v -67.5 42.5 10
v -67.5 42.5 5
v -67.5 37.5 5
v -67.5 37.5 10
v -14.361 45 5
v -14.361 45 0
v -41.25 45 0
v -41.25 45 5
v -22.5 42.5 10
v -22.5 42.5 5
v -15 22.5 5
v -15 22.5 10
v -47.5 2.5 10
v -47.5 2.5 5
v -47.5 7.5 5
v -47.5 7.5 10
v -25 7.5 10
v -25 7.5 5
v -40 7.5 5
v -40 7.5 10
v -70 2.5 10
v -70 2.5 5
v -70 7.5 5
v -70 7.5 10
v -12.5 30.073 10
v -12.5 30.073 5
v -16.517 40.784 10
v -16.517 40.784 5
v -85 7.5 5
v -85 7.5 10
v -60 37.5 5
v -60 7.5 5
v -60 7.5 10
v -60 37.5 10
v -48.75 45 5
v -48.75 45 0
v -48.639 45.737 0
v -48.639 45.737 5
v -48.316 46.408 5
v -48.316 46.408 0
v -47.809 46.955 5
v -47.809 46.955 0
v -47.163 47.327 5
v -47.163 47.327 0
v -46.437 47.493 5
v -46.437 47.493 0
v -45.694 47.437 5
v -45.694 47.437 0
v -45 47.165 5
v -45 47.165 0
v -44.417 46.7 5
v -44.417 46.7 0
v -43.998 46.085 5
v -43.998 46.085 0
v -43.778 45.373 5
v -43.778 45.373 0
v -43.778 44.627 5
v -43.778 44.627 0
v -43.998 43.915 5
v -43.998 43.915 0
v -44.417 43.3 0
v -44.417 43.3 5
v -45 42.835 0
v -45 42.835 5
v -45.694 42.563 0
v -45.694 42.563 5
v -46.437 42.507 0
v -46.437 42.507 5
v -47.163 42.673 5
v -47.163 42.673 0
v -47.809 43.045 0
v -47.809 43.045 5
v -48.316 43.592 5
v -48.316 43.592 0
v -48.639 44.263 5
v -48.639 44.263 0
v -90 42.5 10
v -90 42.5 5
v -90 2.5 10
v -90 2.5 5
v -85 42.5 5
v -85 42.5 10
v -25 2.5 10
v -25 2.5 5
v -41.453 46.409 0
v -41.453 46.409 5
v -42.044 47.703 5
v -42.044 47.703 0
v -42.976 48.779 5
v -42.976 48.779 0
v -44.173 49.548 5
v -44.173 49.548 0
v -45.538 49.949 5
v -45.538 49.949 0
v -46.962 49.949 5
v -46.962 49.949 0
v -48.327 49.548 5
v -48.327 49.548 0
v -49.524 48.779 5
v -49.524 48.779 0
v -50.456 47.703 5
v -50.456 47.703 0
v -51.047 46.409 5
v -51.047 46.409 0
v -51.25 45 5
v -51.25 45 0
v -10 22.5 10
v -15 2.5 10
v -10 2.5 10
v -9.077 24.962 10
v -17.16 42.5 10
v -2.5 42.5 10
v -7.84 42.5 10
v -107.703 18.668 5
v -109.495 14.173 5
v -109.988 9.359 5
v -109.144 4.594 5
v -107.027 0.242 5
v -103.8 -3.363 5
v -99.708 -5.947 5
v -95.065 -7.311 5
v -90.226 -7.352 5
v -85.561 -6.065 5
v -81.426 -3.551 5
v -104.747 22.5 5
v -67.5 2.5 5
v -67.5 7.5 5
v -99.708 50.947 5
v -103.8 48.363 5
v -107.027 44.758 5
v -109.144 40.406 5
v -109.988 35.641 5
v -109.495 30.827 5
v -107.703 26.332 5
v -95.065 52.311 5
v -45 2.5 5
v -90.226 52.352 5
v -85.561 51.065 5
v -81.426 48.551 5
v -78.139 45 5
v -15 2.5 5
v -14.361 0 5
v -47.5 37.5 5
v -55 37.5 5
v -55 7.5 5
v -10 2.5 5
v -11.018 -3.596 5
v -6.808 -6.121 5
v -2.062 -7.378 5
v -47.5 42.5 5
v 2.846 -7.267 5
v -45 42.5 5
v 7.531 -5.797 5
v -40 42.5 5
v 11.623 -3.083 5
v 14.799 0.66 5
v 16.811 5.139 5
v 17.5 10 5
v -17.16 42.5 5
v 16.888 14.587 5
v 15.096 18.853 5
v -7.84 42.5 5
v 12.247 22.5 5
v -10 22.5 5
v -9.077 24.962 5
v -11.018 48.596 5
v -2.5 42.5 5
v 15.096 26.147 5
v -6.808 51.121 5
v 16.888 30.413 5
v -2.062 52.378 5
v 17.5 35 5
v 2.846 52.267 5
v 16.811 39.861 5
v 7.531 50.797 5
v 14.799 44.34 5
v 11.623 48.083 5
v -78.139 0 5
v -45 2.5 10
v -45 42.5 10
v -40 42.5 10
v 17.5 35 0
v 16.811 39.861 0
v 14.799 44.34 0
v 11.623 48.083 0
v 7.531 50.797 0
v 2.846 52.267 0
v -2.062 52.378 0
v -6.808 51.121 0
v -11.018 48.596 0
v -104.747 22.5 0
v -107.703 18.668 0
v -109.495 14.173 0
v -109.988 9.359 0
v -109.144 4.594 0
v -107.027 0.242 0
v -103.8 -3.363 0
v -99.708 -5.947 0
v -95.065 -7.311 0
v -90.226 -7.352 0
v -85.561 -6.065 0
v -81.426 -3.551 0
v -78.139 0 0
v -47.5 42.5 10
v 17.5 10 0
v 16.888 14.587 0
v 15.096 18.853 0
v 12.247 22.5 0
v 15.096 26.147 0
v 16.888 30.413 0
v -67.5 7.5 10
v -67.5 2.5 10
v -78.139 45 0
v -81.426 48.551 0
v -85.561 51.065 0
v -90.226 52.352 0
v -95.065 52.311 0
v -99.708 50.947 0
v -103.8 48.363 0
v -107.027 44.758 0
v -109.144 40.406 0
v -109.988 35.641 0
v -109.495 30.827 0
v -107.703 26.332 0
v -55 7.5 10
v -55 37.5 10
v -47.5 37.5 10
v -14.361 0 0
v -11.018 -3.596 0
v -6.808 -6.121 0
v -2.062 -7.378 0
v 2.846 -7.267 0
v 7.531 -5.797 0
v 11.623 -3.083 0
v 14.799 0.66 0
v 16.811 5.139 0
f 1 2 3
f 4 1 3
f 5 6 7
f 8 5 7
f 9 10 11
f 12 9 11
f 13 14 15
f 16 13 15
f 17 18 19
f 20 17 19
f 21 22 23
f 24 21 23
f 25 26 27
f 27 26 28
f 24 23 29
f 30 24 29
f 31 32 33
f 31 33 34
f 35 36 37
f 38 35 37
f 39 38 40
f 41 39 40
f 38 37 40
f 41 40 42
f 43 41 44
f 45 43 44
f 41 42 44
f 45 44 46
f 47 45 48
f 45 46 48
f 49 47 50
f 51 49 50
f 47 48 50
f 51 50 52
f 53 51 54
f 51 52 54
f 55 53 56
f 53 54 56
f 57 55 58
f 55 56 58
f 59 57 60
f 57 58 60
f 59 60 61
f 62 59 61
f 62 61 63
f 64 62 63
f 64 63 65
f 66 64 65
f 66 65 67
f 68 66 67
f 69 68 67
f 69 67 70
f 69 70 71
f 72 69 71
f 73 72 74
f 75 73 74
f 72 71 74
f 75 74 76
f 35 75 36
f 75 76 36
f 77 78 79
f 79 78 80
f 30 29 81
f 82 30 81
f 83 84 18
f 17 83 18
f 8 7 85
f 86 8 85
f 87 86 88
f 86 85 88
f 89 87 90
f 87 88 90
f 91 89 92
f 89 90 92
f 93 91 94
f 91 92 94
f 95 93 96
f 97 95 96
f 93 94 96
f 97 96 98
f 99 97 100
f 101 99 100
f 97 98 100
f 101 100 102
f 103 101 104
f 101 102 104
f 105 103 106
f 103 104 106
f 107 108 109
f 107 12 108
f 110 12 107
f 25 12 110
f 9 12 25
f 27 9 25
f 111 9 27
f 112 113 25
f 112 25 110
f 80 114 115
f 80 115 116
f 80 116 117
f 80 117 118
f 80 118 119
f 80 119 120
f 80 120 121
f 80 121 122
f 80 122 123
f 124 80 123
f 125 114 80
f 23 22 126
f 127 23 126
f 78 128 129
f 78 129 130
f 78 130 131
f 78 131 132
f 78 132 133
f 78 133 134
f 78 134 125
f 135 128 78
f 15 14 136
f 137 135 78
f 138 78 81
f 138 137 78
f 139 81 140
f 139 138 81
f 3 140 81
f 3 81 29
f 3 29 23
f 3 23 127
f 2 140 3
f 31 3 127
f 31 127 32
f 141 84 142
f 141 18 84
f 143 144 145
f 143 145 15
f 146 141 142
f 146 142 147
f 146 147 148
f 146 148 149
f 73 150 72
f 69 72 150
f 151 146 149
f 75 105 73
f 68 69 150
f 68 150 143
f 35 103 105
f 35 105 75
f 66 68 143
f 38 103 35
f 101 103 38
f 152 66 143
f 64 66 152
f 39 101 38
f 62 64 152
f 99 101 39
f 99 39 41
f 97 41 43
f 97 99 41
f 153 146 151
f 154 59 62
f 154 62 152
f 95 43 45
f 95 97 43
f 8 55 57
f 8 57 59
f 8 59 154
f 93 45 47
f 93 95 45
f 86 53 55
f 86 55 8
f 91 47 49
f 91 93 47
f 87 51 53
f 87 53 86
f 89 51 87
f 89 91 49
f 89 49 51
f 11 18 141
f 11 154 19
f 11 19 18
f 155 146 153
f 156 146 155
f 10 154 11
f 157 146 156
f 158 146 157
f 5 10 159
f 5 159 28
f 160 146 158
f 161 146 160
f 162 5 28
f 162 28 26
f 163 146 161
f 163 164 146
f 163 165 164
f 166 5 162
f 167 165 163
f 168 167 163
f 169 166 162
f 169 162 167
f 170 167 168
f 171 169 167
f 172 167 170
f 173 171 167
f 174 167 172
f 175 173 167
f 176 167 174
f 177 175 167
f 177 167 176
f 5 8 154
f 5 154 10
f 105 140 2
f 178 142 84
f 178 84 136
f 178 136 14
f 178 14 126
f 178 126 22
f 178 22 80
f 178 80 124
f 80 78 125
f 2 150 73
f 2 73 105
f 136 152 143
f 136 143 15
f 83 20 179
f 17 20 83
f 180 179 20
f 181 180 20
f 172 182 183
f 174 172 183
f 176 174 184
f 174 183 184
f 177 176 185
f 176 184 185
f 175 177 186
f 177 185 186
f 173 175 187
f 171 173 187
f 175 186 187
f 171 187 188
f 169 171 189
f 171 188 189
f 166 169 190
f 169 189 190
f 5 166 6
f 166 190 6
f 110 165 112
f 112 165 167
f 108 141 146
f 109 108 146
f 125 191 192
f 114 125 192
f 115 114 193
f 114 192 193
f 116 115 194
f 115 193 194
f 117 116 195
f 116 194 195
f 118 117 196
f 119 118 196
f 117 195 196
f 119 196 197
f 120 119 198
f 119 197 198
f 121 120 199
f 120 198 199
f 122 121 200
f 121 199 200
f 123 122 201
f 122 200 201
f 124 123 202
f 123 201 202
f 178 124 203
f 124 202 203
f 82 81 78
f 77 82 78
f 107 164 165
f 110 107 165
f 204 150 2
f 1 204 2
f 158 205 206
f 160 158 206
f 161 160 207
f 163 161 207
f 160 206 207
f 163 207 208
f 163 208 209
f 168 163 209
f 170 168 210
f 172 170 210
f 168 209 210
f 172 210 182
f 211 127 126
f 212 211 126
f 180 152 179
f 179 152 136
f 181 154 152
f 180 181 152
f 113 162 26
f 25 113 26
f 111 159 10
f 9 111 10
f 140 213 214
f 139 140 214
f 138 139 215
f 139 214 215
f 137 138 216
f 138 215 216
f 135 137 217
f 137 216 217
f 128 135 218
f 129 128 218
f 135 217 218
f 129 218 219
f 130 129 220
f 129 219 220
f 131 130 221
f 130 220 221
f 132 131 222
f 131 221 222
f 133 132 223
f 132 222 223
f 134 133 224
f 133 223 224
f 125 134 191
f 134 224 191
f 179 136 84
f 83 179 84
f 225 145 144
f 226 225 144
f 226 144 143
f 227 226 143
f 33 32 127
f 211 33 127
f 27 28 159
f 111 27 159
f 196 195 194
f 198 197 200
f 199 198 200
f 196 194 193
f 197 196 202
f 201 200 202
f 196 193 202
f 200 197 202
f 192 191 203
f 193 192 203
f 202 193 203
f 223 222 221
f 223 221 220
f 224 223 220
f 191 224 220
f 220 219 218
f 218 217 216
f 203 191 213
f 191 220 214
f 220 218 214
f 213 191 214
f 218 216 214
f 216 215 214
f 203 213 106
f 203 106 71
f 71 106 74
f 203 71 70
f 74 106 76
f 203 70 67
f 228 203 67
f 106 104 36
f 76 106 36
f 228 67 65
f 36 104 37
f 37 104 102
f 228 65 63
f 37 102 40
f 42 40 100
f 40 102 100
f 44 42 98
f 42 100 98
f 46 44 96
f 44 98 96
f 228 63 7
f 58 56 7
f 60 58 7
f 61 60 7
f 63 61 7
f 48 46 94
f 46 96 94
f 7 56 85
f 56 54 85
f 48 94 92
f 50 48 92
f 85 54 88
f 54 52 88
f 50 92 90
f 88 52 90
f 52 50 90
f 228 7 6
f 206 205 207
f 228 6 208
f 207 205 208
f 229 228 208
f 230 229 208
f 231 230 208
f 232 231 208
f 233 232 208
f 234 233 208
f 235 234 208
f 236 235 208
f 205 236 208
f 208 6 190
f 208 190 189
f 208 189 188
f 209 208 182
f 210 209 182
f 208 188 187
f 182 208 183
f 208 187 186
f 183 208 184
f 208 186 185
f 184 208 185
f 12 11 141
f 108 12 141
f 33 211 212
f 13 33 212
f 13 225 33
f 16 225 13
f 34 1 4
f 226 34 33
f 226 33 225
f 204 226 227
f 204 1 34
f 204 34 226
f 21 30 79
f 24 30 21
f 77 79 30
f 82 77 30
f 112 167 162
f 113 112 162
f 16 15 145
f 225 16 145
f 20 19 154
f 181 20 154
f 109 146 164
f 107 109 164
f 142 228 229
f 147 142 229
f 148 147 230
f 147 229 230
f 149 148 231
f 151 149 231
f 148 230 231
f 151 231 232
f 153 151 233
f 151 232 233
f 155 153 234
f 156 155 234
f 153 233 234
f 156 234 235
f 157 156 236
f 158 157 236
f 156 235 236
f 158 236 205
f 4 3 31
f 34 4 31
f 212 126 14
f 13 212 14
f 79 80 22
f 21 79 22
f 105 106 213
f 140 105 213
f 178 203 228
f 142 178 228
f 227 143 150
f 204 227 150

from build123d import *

# Parameters (mm, degrees)
F0_W     = 15
F0_H     = 35
F0_W_2   = 5
F0_H_2   = 5
F0_W_3   = 7.5
F0_H_3   = 30
F1_DEPTH = 5
F2_DEPTH = 10


with BuildPart() as f1:
    # F0 (on Top) → F1 (new body)
    with BuildSketch(Plane.XY):
        with BuildLine():
            Line((-90, 27.3205080757), (-90, 42.5))
            Line((-90, 42.5), (-85, 42.5))
            Line((-85, 42.5), (-76.6886116992, 42.5))
            ThreePointArc((-76.6886116992, 42.5), (-77.3619060553, 43.7799835832), (-78.1385933837, 45))
            Line((-78.1385933837, 45), (-92.5, 45))
            Line((-92.5, 45), (-92.5, 27.5))
            ThreePointArc((-92.5, 27.5), (-91.2467824061, 27.4550693399), (-90, 27.3205080757))
        make_face()
        with BuildLine():
            ThreePointArc((-78.1385933837, 45), (-77.3619060553, 43.7799835832), (-76.6886116992, 42.5))
            Line((-76.6886116992, 42.5), (-70, 42.5))
            Line((-70, 42.5), (-70, 7.5))
            Line((-70, 7.5), (-70, 2.5))
            Line((-70, 2.5), (-76.6886116992, 2.5))
            ThreePointArc((-76.6886116992, 2.5), (-77.3619060553, 1.2200164168), (-78.1385933837, 0))
            Line((-78.1385933837, 0), (-14.3614066163, 0))
            ThreePointArc((-14.3614066163, 0), (-15.1380939447, 1.2200164168), (-15.8113883008, 2.5))
            Line((-15.8113883008, 2.5), (-22.5, 2.5))
            Line((-22.5, 2.5), (-22.5, 22.5))
            Line((-22.5, 22.5), (-22.5, 42.5))
            Line((-22.5, 42.5), (-17.1599976592, 42.5))
            Line((-17.1599976592, 42.5), (-15.8113883008, 42.5))
            ThreePointArc((-15.8113883008, 42.5), (-15.1380939447, 43.7799835832), (-14.3614066163, 45))
            Line((-14.3614066163, 45), (-41.25, 45))
            ThreePointArc((-41.25, 45), (-41.4203708686, 43.7059047745), (-41.9198729811, 42.5))
            Line((-41.9198729811, 42.5), (-40, 42.5))
            Line((-40, 42.5), (-25, 42.5))
            Line((-25, 42.5), (-25, 7.5))
            Line((-25, 7.5), (-25, 2.5))
            Line((-25, 2.5), (-40, 2.5))
            Line((-40, 2.5), (-45, 2.5))
            Line((-45, 2.5), (-45, 7.5))
            Line((-45, 7.5), (-45, 40.1587708172))
            ThreePointArc((-45, 40.1587708172), (-46.25, 40), (-47.5, 40.1587708172))
            Line((-47.5, 40.1587708172), (-47.5, 37.5))
            Line((-47.5, 37.5), (-47.5, 7.5))
            Line((-47.5, 7.5), (-47.5, 2.5))
            Line((-47.5, 2.5), (-67.5, 2.5))
            Line((-67.5, 2.5), (-67.5, 7.5))
            Line((-67.5, 7.5), (-67.5, 37.5))
            Line((-67.5, 37.5), (-67.5, 42.5))
            Line((-67.5, 42.5), (-50.5801270189, 42.5))
            ThreePointArc((-50.5801270189, 42.5), (-51.0796291314, 43.7059047745), (-51.25, 45))
            Line((-51.25, 45), (-78.1385933837, 45))
        make_face()
        with BuildLine():
            Line((-90, 7.5), (-90, 17.6794919243))
            ThreePointArc((-90, 17.6794919243), (-91.2467824061, 17.5449306601), (-92.5, 17.5))
            Line((-92.5, 17.5), (-92.5, 0))
            Line((-92.5, 0), (-78.1385933837, 0))
            ThreePointArc((-78.1385933837, 0), (-77.3619060553, 1.2200164168), (-76.6886116992, 2.5))
            Line((-76.6886116992, 2.5), (-85, 2.5))
            Line((-85, 2.5), (-90, 2.5))
            Line((-90, 2.5), (-90, 7.5))
        make_face()
        with BuildLine():
            ThreePointArc((-104.7474487139, 22.5), (-99.1143782777, 26.201851746), (-92.5, 27.5))
            Line((-92.5, 27.5), (-92.5, 45))
            Line((-92.5, 45), (-78.1385933837, 45))
            ThreePointArc((-78.1385933837, 45), (-103.7995444379, 48.3630196998), (-104.7474487139, 22.5))
        make_face()
        with BuildLine():
            Line((-92.5, 17.5), (-92.5, 27.5))
            ThreePointArc((-92.5, 27.5), (-99.1143782777, 26.201851746), (-104.7474487139, 22.5))
            ThreePointArc((-104.7474487139, 22.5), (-99.1143782777, 18.798148254), (-92.5, 17.5))
        make_face()
        with BuildLine():
            Line((-92.5, 0), (-92.5, 17.5))
            ThreePointArc((-92.5, 17.5), (-99.1143782777, 18.798148254), (-104.7474487139, 22.5))
            ThreePointArc((-104.7474487139, 22.5), (-103.7995444379, -3.3630196998), (-78.1385933837, 0))
            Line((-78.1385933837, 0), (-92.5, 0))
        make_face()
        with BuildLine():
            ThreePointArc((-41.25, 45), (-46.25, 50), (-51.25, 45))
            Line((-51.25, 45), (-48.75, 45))
            ThreePointArc((-48.75, 45), (-46.25, 47.5), (-43.75, 45))
            Line((-43.75, 45), (-41.25, 45))
        make_face()
        with BuildLine():
            Line((-48.75, 45), (-51.25, 45))
            ThreePointArc((-51.25, 45), (-51.0796291314, 43.7059047745), (-50.5801270189, 42.5))
            Line((-50.5801270189, 42.5), (-47.5, 42.5))
            Line((-47.5, 42.5), (-47.5, 40.1587708172))
            ThreePointArc((-47.5, 40.1587708172), (-46.25, 40), (-45, 40.1587708172))
            Line((-45, 40.1587708172), (-45, 42.5))
            Line((-45, 42.5), (-41.9198729811, 42.5))
            ThreePointArc((-41.9198729811, 42.5), (-41.4203708686, 43.7059047745), (-41.25, 45))
            Line((-41.25, 45), (-43.75, 45))
            ThreePointArc((-43.75, 45), (-46.25, 42.5), (-48.75, 45))
        make_face()
        with BuildLine():
            ThreePointArc((-15.8113883008, 2.5), (-15.1380939447, 1.2200164168), (-14.3614066163, 0))
            Line((-14.3614066163, 0), (0, 0))
            Line((0, 0), (0, 17.5))
            ThreePointArc((0, 17.5), (-1.2532175939, 17.5449306601), (-2.5, 17.6794919243))
            Line((-2.5, 17.6794919243), (-2.5, 2.5))
            Line((-2.5, 2.5), (-10, 2.5))
            Line((-10, 2.5), (-15, 2.5))
            Line((-15, 2.5), (-15.8113883008, 2.5))
        make_face()
        with BuildLine():
            Line((0, 0), (-14.3614066163, 0))
            ThreePointArc((-14.3614066163, 0), (5.2404858655, -6.6969251029), (17.5, 10))
            ThreePointArc((17.5, 10), (16.1335109709, 16.7793675039), (12.2474487139, 22.5))
            ThreePointArc((12.2474487139, 22.5), (6.6143782777, 18.798148254), (0, 17.5))
            Line((0, 17.5), (0, 0))
        make_face()
        with BuildLine():
            ThreePointArc((17.5, 35), (5.2404858655, 51.6969251029), (-14.3614066163, 45))
            Line((-14.3614066163, 45), (0, 45))
            Line((0, 45), (0, 27.5))
            ThreePointArc((0, 27.5), (6.6143782777, 26.201851746), (12.2474487139, 22.5))
            ThreePointArc((12.2474487139, 22.5), (16.1335109709, 28.2206324961), (17.5, 35))
        make_face()
        with BuildLine():
            Line((0, 45), (-14.3614066163, 45))
            ThreePointArc((-14.3614066163, 45), (-15.1380939447, 43.7799835832), (-15.8113883008, 42.5))
            Line((-15.8113883008, 42.5), (-7.8400023408, 42.5))
            Line((-7.8400023408, 42.5), (-2.5, 42.5))
            Line((-2.5, 42.5), (-2.5, 27.3205080757))
            ThreePointArc((-2.5, 27.3205080757), (-1.2532175939, 27.4550693399), (0, 27.5))
            Line((0, 27.5), (0, 45))
        make_face()
        with BuildLine():
            Line((0, 27.5), (0, 17.5))
            ThreePointArc((0, 17.5), (6.6143782777, 18.798148254), (12.2474487139, 22.5))
            ThreePointArc((12.2474487139, 22.5), (6.6143782777, 26.201851746), (0, 27.5))
        make_face()
        with BuildLine():
            ThreePointArc((-2.5, 17.6794919243), (-1.2532175939, 17.5449306601), (0, 17.5))
            Line((0, 17.5), (0, 27.5))
            ThreePointArc((0, 27.5), (-1.2532175939, 27.4550693399), (-2.5, 27.3205080757))
            Line((-2.5, 27.3205080757), (-2.5, 22.5))
            Line((-2.5, 22.5), (-2.5, 17.6794919243))
        make_face()
        with BuildLine():
            Line((-2.5, 2.5), (-2.5, 17.6794919243))
            ThreePointArc((-2.5, 17.6794919243), (-6.4227385407, 18.7212276372), (-10, 20.6385933837))
            Line((-10, 20.6385933837), (-10, 2.5))
            Line((-10, 2.5), (-2.5, 2.5))
        make_face()
        with BuildLine():
            ThreePointArc((-10, 20.6385933837), (-6.4227385407, 18.7212276372), (-2.5, 17.6794919243))
            Line((-2.5, 17.6794919243), (-2.5, 22.5))
            Line((-2.5, 22.5), (-10, 22.5))
            Line((-10, 22.5), (-10, 20.6385933837))
        make_face()
        with BuildLine():
            ThreePointArc((-9.0767310941, 24.9620504158), (-5.9072630159, 26.4728335043), (-2.5, 27.3205080757))
            Line((-2.5, 27.3205080757), (-2.5, 42.5))
            Line((-2.5, 42.5), (-9.0767310941, 24.9620504158))
        make_face()
        with BuildLine():
            Line((-2.5, 22.5), (-2.5, 27.3205080757))
            ThreePointArc((-2.5, 27.3205080757), (-5.9072630159, 26.4728335043), (-9.0767310941, 24.9620504158))
            Line((-9.0767310941, 24.9620504158), (-10, 22.5))
            Line((-10, 22.5), (-2.5, 22.5))
        make_face()
        with BuildLine():
            ThreePointArc((-9.0767310941, 24.9620504158), (-10.7329205803, 23.822243516), (-12.2474487139, 22.5))
            Line((-12.2474487139, 22.5), (-10, 22.5))
            Line((-10, 22.5), (-9.0767310941, 24.9620504158))
        make_face()
        with BuildLine():
            Line((-10, 22.5), (-12.2474487139, 22.5))
            ThreePointArc((-12.2474487139, 22.5), (-11.1625916443, 21.5223686138), (-10, 20.6385933837))
            Line((-10, 20.6385933837), (-10, 22.5))
        make_face()
        with BuildLine():
            Line((-15, 19.0138781887), (-15, 2.5))
            Line((-15, 2.5), (-10, 2.5))
            Line((-10, 2.5), (-10, 20.6385933837))
            ThreePointArc((-10, 20.6385933837), (-11.1625916443, 21.5223686138), (-12.2474487139, 22.5))
            ThreePointArc((-12.2474487139, 22.5), (-13.7347779988, 20.8446241671), (-15, 19.0138781887))
        make_face()
        with BuildLine():
            Line((-15, 22.5), (-15, 19.0138781887))
            ThreePointArc((-15, 19.0138781887), (-13.7347779988, 20.8446241671), (-12.2474487139, 22.5))
            Line((-12.2474487139, 22.5), (-15, 22.5))
        make_face()
        with BuildLine():
            ThreePointArc((-15, 19.0138781887), (-17.4789145963, 10.8588041315), (-15.8113883008, 2.5))
            Line((-15.8113883008, 2.5), (-15, 2.5))
            Line((-15, 2.5), (-15, 19.0138781887))
        make_face()
        with BuildLine():
            Line((-22.5, 2.5), (-15.8113883008, 2.5))
            ThreePointArc((-15.8113883008, 2.5), (-17.4789145963, 10.8588041315), (-15, 19.0138781887))
            Line((-15, 19.0138781887), (-15, 22.5))
            Line((-15, 22.5), (-22.5, 22.5))
            Line((-22.5, 22.5), (-22.5, 2.5))
        make_face()
        Polygon((-22.5, 42.5), (-22.5, 22.5), (-15, 22.5), align=None)
        with BuildLine():
            Line((-2.5, 42.5), (-7.8400023408, 42.5))
            Line((-7.8400023408, 42.5), (-12.5, 30.0733395755))
            Line((-12.5, 30.0733395755), (-16.5165078198, 40.7840270951))
            ThreePointArc((-16.5165078198, 40.7840270951), (-17.0416463575, 31.0210190466), (-12.2474487139, 22.5))
            ThreePointArc((-12.2474487139, 22.5), (-10.7329205803, 23.822243516), (-9.0767310941, 24.9620504158))
            Line((-9.0767310941, 24.9620504158), (-2.5, 42.5))
        make_face()
        with BuildLine():
            Line((-16.5165078198, 40.7840270951), (-17.1599976592, 42.5))
            Line((-17.1599976592, 42.5), (-22.5, 42.5))
            Line((-22.5, 42.5), (-15, 22.5))
            Line((-15, 22.5), (-12.2474487139, 22.5))
            ThreePointArc((-12.2474487139, 22.5), (-17.0416463575, 31.0210190466), (-16.5165078198, 40.7840270951))
        make_face()
        with BuildLine():
            Line((-7.8400023408, 42.5), (-15.8113883008, 42.5))
            ThreePointArc((-15.8113883008, 42.5), (-16.1867031124, 41.6513639466), (-16.5165078198, 40.7840270951))
            Line((-16.5165078198, 40.7840270951), (-12.5, 30.0733395755))
            Line((-12.5, 30.0733395755), (-7.8400023408, 42.5))
        make_face()
        with BuildLine():
            ThreePointArc((-16.5165078198, 40.7840270951), (-16.1867031124, 41.6513639466), (-15.8113883008, 42.5))
            Line((-15.8113883008, 42.5), (-17.1599976592, 42.5))
            Line((-17.1599976592, 42.5), (-16.5165078198, 40.7840270951))
        make_face()
        with Locations((-32.5, 25)):
            Rectangle(F0_W, F0_H)
        with BuildLine():
            ThreePointArc((-45, 40.1587708172), (-43.224311168, 41.0193961398), (-41.9198729811, 42.5))
            Line((-41.9198729811, 42.5), (-45, 42.5))
            Line((-45, 42.5), (-45, 40.1587708172))
        make_face()
        with Locations((-42.5, 5)):
            Rectangle(F0_W_2, F0_H_2)
        with Locations((-32.5, 5)):
            Rectangle(F0_W, F0_H_2)
        Polygon((-60, 7.5), (-67.5, 7.5), (-67.5, 2.5), (-47.5, 2.5), (-47.5, 7.5), (-55, 7.5), align=None)
        with Locations((-51.25, 22.5)):
            Rectangle(F0_W_3, F0_H_3)
        with Locations((-57.5, 22.5)):
            Rectangle(F0_W_2, F0_H_3)
        with Locations((-63.75, 22.5)):
            Rectangle(F0_W_3, F0_H_3)
        with BuildLine():
            ThreePointArc((-47.5, 40.1587708172), (-49.275688832, 41.0193961398), (-50.5801270189, 42.5))
            Line((-50.5801270189, 42.5), (-67.5, 42.5))
            Line((-67.5, 42.5), (-67.5, 37.5))
            Line((-67.5, 37.5), (-60, 37.5))
            Line((-60, 37.5), (-55, 37.5))
            Line((-55, 37.5), (-47.5, 37.5))
            Line((-47.5, 37.5), (-47.5, 40.1587708172))
        make_face()
        with BuildLine():
            Line((-47.5, 42.5), (-50.5801270189, 42.5))
            ThreePointArc((-50.5801270189, 42.5), (-49.275688832, 41.0193961398), (-47.5, 40.1587708172))
            Line((-47.5, 40.1587708172), (-47.5, 42.5))
        make_face()
        with BuildLine():
            Line((-70, 42.5), (-76.6886116992, 42.5))
            ThreePointArc((-76.6886116992, 42.5), (-75.4273713907, 38.843872054), (-75, 35))
            ThreePointArc((-75, 35), (-76.3664890291, 28.2206324961), (-80.2525512861, 22.5))
            ThreePointArc((-80.2525512861, 22.5), (-76.3664890291, 16.7793675039), (-75, 10))
            ThreePointArc((-75, 10), (-75.0449306601, 8.7467824061), (-75.1794919243, 7.5))
            Line((-75.1794919243, 7.5), (-70, 7.5))
            Line((-70, 7.5), (-70, 42.5))
        make_face()
        with BuildLine():
            Line((-76.6886116992, 42.5), (-85, 42.5))
            Line((-85, 42.5), (-85, 25.8113883008))
            ThreePointArc((-85, 25.8113883008), (-82.4884189162, 24.3533356473), (-80.2525512861, 22.5))
            ThreePointArc((-80.2525512861, 22.5), (-76.3664890291, 28.2206324961), (-75, 35))
            ThreePointArc((-75, 35), (-75.4273713907, 38.843872054), (-76.6886116992, 42.5))
        make_face()
        with BuildLine():
            ThreePointArc((-80.2525512861, 22.5), (-82.4884189162, 20.6466643527), (-85, 19.1886116992))
            Line((-85, 19.1886116992), (-85, 7.5))
            Line((-85, 7.5), (-75.1794919243, 7.5))
            ThreePointArc((-75.1794919243, 7.5), (-75.0449306601, 8.7467824061), (-75, 10))
            ThreePointArc((-75, 10), (-76.3664890291, 16.7793675039), (-80.2525512861, 22.5))
        make_face()
        with BuildLine():
            ThreePointArc((-80.2525512861, 22.5), (-82.4884189162, 24.3533356473), (-85, 25.8113883008))
            Line((-85, 25.8113883008), (-85, 19.1886116992))
            ThreePointArc((-85, 19.1886116992), (-82.4884189162, 20.6466643527), (-80.2525512861, 22.5))
        make_face()
        with BuildLine():
            ThreePointArc((-85, 25.8113883008), (-87.4433844695, 26.7535261774), (-90, 27.3205080757))
            Line((-90, 27.3205080757), (-90, 17.6794919243))
            ThreePointArc((-90, 17.6794919243), (-87.4433844695, 18.2464738226), (-85, 19.1886116992))
            Line((-85, 19.1886116992), (-85, 25.8113883008))
        make_face()
        with BuildLine():
            Line((-85, 42.5), (-90, 42.5))
            Line((-90, 42.5), (-90, 27.3205080757))
            ThreePointArc((-90, 27.3205080757), (-87.4433844695, 26.7535261774), (-85, 25.8113883008))
            Line((-85, 25.8113883008), (-85, 42.5))
        make_face()
        with BuildLine():
            Line((-90, 17.6794919243), (-90, 27.3205080757))
            ThreePointArc((-90, 27.3205080757), (-91.2467824061, 27.4550693399), (-92.5, 27.5))
            Line((-92.5, 27.5), (-92.5, 17.5))
            ThreePointArc((-92.5, 17.5), (-91.2467824061, 17.5449306601), (-90, 17.6794919243))
        make_face()
        with BuildLine():
            ThreePointArc((-85, 19.1886116992), (-87.4433844695, 18.2464738226), (-90, 17.6794919243))
            Line((-90, 17.6794919243), (-90, 7.5))
            Line((-90, 7.5), (-85, 7.5))
            Line((-85, 7.5), (-85, 19.1886116992))
        make_face()
        with Locations((-87.5, 5)):
            Rectangle(F0_W_2, F0_H_2)
        with BuildLine():
            Line((-75.1794919243, 7.5), (-85, 7.5))
            Line((-85, 7.5), (-85, 2.5))
            Line((-85, 2.5), (-76.6886116992, 2.5))
            ThreePointArc((-76.6886116992, 2.5), (-75.7464738226, 4.9433844695), (-75.1794919243, 7.5))
        make_face()
        with BuildLine():
            Line((-70, 2.5), (-70, 7.5))
            Line((-70, 7.5), (-75.1794919243, 7.5))
            ThreePointArc((-75.1794919243, 7.5), (-75.7464738226, 4.9433844695), (-76.6886116992, 2.5))
            Line((-76.6886116992, 2.5), (-70, 2.5))
        make_face()
    extrude(amount=F1_DEPTH)

    # F0 (on Top) → F2 (join)
    with BuildSketch(Plane.XY):
        with BuildLine():
            Line((-85, 42.5), (-90, 42.5))
            Line((-90, 42.5), (-90, 27.3205080757))
            ThreePointArc((-90, 27.3205080757), (-87.4433844695, 26.7535261774), (-85, 25.8113883008))
            Line((-85, 25.8113883008), (-85, 42.5))
        make_face()
        with BuildLine():
            ThreePointArc((-85, 25.8113883008), (-87.4433844695, 26.7535261774), (-90, 27.3205080757))
            Line((-90, 27.3205080757), (-90, 17.6794919243))
            ThreePointArc((-90, 17.6794919243), (-87.4433844695, 18.2464738226), (-85, 19.1886116992))
            Line((-85, 19.1886116992), (-85, 25.8113883008))
        make_face()
        with BuildLine():
            ThreePointArc((-85, 19.1886116992), (-87.4433844695, 18.2464738226), (-90, 17.6794919243))
            Line((-90, 17.6794919243), (-90, 7.5))
            Line((-90, 7.5), (-85, 7.5))
            Line((-85, 7.5), (-85, 19.1886116992))
        make_face()
        with Locations((-87.5, 5)):
            Rectangle(F0_W_2, F0_H_2)
        with BuildLine():
            Line((-75.1794919243, 7.5), (-85, 7.5))
            Line((-85, 7.5), (-85, 2.5))
            Line((-85, 2.5), (-76.6886116992, 2.5))
            ThreePointArc((-76.6886116992, 2.5), (-75.7464738226, 4.9433844695), (-75.1794919243, 7.5))
        make_face()
        with BuildLine():
            Line((-70, 2.5), (-70, 7.5))
            Line((-70, 7.5), (-75.1794919243, 7.5))
            ThreePointArc((-75.1794919243, 7.5), (-75.7464738226, 4.9433844695), (-76.6886116992, 2.5))
            Line((-76.6886116992, 2.5), (-70, 2.5))
        make_face()
        with Locations((-57.5, 22.5)):
            Rectangle(F0_W_2, F0_H_3)
        with BuildLine():
            ThreePointArc((-47.5, 40.1587708172), (-49.275688832, 41.0193961398), (-50.5801270189, 42.5))
            Line((-50.5801270189, 42.5), (-67.5, 42.5))
            Line((-67.5, 42.5), (-67.5, 37.5))
            Line((-67.5, 37.5), (-60, 37.5))
            Line((-60, 37.5), (-55, 37.5))
            Line((-55, 37.5), (-47.5, 37.5))
            Line((-47.5, 37.5), (-47.5, 40.1587708172))
        make_face()
        with BuildLine():
            Line((-47.5, 42.5), (-50.5801270189, 42.5))
            ThreePointArc((-50.5801270189, 42.5), (-49.275688832, 41.0193961398), (-47.5, 40.1587708172))
            Line((-47.5, 40.1587708172), (-47.5, 42.5))
        make_face()
        Polygon((-60, 7.5), (-67.5, 7.5), (-67.5, 2.5), (-47.5, 2.5), (-47.5, 7.5), (-55, 7.5), align=None)
        with BuildLine():
            ThreePointArc((-45, 40.1587708172), (-43.224311168, 41.0193961398), (-41.9198729811, 42.5))
            Line((-41.9198729811, 42.5), (-45, 42.5))
            Line((-45, 42.5), (-45, 40.1587708172))
        make_face()
        with Locations((-42.5, 5)):
            Rectangle(F0_W_2, F0_H_2)
        with Locations((-32.5, 5)):
            Rectangle(F0_W, F0_H_2)
        with BuildLine():
            Line((-15, 19.0138781887), (-15, 2.5))
            Line((-15, 2.5), (-10, 2.5))
            Line((-10, 2.5), (-10, 20.6385933837))
            ThreePointArc((-10, 20.6385933837), (-11.1625916443, 21.5223686138), (-12.2474487139, 22.5))
            ThreePointArc((-12.2474487139, 22.5), (-13.7347779988, 20.8446241671), (-15, 19.0138781887))
        make_face()
        with BuildLine():
            Line((-2.5, 42.5), (-7.8400023408, 42.5))
            Line((-7.8400023408, 42.5), (-12.5, 30.0733395755))
            Line((-12.5, 30.0733395755), (-16.5165078198, 40.7840270951))
            ThreePointArc((-16.5165078198, 40.7840270951), (-17.0416463575, 31.0210190466), (-12.2474487139, 22.5))
            ThreePointArc((-12.2474487139, 22.5), (-10.7329205803, 23.822243516), (-9.0767310941, 24.9620504158))
            Line((-9.0767310941, 24.9620504158), (-2.5, 42.5))
        make_face()
        with BuildLine():
            Line((-16.5165078198, 40.7840270951), (-17.1599976592, 42.5))
            Line((-17.1599976592, 42.5), (-22.5, 42.5))
            Line((-22.5, 42.5), (-15, 22.5))
            Line((-15, 22.5), (-12.2474487139, 22.5))
            ThreePointArc((-12.2474487139, 22.5), (-17.0416463575, 31.0210190466), (-16.5165078198, 40.7840270951))
        make_face()
        with BuildLine():
            Line((-15, 22.5), (-15, 19.0138781887))
            ThreePointArc((-15, 19.0138781887), (-13.7347779988, 20.8446241671), (-12.2474487139, 22.5))
            Line((-12.2474487139, 22.5), (-15, 22.5))
        make_face()
        with BuildLine():
            Line((-10, 22.5), (-12.2474487139, 22.5))
            ThreePointArc((-12.2474487139, 22.5), (-11.1625916443, 21.5223686138), (-10, 20.6385933837))
            Line((-10, 20.6385933837), (-10, 22.5))
        make_face()
        with BuildLine():
            ThreePointArc((-9.0767310941, 24.9620504158), (-10.7329205803, 23.822243516), (-12.2474487139, 22.5))
            Line((-12.2474487139, 22.5), (-10, 22.5))
            Line((-10, 22.5), (-9.0767310941, 24.9620504158))
        make_face()
        with BuildLine():
            Line((-40, 42.5), (-41.9198729811, 42.5))
            ThreePointArc((-41.9198729811, 42.5), (-43.224311168, 41.0193961398), (-45, 40.1587708172))
            Line((-45, 40.1587708172), (-45, 7.5))
            Line((-45, 7.5), (-40, 7.5))
            Line((-40, 7.5), (-40, 42.5))
        make_face()
    extrude(amount=F2_DEPTH)


solid = f1.part
